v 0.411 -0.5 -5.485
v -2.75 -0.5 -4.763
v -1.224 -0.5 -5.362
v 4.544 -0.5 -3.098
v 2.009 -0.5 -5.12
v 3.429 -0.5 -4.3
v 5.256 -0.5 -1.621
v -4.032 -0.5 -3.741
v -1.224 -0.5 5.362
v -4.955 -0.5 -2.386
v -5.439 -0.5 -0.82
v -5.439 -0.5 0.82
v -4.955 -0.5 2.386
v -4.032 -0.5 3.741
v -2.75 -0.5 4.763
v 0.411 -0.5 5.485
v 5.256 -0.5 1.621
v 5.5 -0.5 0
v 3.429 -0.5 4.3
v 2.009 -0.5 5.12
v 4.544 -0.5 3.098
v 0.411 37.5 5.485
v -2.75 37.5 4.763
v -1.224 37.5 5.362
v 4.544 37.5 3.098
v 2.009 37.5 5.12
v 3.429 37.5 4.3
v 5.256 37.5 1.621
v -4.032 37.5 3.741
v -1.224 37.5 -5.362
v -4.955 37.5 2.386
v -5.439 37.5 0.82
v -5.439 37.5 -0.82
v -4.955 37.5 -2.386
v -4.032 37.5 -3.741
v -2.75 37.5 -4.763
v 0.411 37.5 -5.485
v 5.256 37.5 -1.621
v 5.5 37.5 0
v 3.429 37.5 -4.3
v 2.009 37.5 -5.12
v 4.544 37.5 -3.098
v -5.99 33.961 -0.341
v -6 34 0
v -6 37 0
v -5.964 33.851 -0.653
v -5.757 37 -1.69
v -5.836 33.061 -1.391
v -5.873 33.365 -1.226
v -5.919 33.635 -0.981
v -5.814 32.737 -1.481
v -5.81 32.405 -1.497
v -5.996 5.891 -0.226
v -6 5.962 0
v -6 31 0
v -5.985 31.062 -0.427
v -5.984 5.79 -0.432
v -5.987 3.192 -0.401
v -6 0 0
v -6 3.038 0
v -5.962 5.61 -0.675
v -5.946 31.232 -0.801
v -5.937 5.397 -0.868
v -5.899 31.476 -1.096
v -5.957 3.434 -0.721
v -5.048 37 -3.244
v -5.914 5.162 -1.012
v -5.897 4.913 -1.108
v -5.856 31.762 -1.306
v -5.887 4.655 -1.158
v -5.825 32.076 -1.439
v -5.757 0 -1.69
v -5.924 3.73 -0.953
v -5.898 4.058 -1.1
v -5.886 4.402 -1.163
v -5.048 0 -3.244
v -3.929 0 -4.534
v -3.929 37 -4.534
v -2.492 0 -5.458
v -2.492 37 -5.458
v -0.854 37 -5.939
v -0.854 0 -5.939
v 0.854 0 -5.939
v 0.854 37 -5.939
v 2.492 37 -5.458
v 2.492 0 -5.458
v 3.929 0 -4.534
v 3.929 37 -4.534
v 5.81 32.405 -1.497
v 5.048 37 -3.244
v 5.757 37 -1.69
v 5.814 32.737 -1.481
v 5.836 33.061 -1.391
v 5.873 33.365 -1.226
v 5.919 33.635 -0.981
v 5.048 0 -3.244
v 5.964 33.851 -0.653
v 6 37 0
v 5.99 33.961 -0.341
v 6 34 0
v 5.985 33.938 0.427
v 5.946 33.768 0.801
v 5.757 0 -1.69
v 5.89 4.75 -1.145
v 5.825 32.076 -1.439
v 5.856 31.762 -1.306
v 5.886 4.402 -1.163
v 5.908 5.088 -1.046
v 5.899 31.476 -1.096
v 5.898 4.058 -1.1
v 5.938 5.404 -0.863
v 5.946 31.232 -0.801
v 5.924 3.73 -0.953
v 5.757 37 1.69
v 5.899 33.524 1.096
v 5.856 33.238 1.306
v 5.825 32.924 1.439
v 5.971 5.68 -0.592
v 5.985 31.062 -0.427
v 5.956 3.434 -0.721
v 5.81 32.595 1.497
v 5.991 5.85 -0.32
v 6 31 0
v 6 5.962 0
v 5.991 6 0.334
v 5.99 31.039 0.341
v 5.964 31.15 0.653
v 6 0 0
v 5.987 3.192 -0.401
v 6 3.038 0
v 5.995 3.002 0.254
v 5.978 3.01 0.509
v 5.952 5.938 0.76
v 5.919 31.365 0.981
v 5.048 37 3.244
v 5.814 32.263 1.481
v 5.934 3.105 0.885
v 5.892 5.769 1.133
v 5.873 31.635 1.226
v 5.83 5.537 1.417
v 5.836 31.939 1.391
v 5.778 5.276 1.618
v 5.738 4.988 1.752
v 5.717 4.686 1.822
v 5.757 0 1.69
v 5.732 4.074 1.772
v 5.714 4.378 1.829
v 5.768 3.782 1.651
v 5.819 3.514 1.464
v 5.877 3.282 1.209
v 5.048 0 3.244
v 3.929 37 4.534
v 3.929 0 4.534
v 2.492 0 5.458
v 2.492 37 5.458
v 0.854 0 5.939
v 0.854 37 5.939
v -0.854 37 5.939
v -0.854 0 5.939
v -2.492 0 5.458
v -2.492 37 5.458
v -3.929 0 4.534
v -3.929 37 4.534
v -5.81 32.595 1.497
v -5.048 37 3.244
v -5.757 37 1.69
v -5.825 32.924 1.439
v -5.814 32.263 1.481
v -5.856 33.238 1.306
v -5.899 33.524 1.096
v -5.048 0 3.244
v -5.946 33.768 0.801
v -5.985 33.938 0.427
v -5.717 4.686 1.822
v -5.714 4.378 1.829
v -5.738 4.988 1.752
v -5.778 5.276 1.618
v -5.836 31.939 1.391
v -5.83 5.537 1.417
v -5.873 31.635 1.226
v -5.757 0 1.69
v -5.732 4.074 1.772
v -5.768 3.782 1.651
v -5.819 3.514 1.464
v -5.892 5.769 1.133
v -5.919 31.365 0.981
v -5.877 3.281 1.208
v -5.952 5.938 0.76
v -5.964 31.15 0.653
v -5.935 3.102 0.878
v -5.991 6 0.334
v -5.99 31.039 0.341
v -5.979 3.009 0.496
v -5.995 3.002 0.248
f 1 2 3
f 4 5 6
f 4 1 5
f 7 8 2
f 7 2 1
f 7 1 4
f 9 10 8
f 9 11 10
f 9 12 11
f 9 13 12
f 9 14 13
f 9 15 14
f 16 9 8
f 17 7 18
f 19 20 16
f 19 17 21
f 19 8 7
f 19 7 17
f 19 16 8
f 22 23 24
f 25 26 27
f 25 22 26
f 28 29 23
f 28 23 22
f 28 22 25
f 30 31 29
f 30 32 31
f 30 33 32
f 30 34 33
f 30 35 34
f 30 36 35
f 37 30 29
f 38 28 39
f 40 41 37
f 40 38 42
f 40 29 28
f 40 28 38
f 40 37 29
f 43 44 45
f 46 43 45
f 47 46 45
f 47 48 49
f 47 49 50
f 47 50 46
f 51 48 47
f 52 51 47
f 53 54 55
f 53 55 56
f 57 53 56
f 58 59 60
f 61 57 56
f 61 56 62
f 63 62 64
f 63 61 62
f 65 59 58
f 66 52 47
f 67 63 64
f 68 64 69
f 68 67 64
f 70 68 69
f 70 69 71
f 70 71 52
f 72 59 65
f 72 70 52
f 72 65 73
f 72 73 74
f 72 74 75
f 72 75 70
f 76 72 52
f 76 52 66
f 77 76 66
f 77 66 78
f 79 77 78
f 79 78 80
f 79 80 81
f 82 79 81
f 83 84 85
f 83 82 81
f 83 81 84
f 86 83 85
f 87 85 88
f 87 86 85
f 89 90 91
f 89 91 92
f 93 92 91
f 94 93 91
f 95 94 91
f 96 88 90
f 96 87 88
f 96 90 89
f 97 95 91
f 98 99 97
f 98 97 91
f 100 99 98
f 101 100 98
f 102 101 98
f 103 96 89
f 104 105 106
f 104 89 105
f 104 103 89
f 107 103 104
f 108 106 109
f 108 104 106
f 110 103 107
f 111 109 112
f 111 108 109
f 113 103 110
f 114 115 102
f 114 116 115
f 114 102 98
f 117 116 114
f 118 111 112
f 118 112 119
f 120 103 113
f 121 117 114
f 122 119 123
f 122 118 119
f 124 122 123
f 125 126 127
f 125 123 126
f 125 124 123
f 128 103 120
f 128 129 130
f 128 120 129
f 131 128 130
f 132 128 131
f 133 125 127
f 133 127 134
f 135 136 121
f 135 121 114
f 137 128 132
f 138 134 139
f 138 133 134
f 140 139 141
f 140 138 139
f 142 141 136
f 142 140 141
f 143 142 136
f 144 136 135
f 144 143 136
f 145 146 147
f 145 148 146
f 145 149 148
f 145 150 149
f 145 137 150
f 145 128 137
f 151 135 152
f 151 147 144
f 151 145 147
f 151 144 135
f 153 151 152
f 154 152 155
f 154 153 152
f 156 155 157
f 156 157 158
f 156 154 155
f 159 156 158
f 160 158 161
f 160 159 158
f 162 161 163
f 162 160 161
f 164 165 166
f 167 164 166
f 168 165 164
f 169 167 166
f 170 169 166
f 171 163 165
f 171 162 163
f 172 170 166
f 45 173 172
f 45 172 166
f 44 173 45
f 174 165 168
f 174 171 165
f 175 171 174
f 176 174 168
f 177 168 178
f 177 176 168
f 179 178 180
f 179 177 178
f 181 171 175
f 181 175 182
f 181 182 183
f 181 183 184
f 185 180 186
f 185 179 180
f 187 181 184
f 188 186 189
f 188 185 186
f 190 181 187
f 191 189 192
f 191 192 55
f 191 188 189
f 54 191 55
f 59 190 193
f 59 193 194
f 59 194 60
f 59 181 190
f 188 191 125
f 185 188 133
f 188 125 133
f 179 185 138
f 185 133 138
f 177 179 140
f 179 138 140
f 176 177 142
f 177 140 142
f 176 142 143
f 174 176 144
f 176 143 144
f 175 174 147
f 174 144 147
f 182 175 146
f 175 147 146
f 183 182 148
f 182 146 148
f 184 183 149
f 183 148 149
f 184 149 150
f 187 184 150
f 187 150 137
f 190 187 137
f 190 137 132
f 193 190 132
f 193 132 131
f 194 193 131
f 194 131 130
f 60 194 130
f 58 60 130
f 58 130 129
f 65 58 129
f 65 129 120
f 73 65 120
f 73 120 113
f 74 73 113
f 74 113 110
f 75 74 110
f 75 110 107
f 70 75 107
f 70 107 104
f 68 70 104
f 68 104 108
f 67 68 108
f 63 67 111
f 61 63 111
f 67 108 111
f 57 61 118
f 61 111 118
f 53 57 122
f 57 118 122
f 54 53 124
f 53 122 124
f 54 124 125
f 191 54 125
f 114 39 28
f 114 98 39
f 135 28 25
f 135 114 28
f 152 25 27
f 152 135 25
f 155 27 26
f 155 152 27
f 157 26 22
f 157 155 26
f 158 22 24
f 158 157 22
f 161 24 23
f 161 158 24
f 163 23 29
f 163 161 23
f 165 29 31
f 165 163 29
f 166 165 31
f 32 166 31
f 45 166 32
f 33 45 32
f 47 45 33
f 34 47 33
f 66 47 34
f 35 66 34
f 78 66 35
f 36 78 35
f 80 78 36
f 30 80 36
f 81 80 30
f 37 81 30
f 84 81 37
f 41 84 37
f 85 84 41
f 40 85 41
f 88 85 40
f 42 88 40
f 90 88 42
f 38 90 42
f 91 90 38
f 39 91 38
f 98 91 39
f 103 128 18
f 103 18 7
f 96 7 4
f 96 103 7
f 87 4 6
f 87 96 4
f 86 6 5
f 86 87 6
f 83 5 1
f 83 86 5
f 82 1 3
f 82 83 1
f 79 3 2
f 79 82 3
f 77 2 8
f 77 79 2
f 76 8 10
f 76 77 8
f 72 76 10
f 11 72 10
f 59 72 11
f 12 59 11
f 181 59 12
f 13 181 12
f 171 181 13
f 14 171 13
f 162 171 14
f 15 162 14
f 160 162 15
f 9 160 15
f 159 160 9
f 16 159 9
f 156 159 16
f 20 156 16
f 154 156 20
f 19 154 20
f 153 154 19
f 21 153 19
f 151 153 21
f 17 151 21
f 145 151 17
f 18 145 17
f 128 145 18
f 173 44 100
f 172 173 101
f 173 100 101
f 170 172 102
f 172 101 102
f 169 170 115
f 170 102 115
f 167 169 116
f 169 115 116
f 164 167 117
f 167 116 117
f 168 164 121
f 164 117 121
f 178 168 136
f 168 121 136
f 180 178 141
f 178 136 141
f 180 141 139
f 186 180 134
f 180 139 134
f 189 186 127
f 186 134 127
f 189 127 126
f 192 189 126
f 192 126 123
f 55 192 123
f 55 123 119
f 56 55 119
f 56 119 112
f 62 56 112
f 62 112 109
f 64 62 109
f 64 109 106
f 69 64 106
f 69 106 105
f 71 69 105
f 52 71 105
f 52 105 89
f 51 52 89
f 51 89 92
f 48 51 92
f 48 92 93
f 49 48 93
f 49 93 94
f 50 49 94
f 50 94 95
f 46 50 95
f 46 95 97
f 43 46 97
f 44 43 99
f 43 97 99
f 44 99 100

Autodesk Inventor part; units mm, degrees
ref_plane "YZ Plane" through (0, 0, 0) normal (1, 0, 0) x (0, 1, 0)
ref_plane "XZ Plane" through (0, 0, 0) normal (0, 1, 0) x (-1, 0, 0)
ref_plane "XY Plane" through (0, 0, 0) normal (0, 0, 1) x (1, 0, 0)
sketch "Sketch1" plane through (0, 0, 0) normal (0, 1, 0) x (-1, 0, 0)
  circle A0 centre (0, 0) radius 6
  dimension "d0" = 12
extrude "Extrusion1" add sketch "Sketch1" along normal blind 37
sketch "Sketch2" plane through (0, 37, 0) normal (0, 1, 0) x (1, 0, 0)
  circle A0 centre (0, 0) radius 6
  dimension "d3" = 12
extrude "Extrusion2" add sketch "Sketch2" along normal blind 0.5 draft -45
sketch "Sketch3" plane through (0, 0, 0) normal (0, -1, 0) x (1, 0, 0)
  circle A0 centre (0, 0) radius 6
  dimension "d6" = 12
extrude "Extrusion3" add sketch "Sketch3" along normal blind 0.5 draft -45
sketch "Sketch5" plane through (0, 0, 0) normal (0, 1, 0) x (-1, 0, 0)
  point P0 (0, 0)
sketch "Sketch7" plane through (0, 0, 0) normal (1, 0, 0) x (0, 1, 0)
  circle A0 centre (4.5, 0.3338) radius 1.5
  point P0 (0, 0)
  dimension "d15" = 3
extrude "Extrusion6" cut sketch "Sketch7" against normal mid plane 12
sketch "Sketch8" plane through (0, 0, 0) normal (1, 0, 0) x (0, 1, 0)
  circle A0 centre (32.5, 0) radius 1.5
  point P0 (0, 0)
  dimension "d18" = 3
extrude "Extrusion7" cut sketch "Sketch8" against normal mid plane 12
properties part number "crankshaft pin" material "Stainless Steel"
